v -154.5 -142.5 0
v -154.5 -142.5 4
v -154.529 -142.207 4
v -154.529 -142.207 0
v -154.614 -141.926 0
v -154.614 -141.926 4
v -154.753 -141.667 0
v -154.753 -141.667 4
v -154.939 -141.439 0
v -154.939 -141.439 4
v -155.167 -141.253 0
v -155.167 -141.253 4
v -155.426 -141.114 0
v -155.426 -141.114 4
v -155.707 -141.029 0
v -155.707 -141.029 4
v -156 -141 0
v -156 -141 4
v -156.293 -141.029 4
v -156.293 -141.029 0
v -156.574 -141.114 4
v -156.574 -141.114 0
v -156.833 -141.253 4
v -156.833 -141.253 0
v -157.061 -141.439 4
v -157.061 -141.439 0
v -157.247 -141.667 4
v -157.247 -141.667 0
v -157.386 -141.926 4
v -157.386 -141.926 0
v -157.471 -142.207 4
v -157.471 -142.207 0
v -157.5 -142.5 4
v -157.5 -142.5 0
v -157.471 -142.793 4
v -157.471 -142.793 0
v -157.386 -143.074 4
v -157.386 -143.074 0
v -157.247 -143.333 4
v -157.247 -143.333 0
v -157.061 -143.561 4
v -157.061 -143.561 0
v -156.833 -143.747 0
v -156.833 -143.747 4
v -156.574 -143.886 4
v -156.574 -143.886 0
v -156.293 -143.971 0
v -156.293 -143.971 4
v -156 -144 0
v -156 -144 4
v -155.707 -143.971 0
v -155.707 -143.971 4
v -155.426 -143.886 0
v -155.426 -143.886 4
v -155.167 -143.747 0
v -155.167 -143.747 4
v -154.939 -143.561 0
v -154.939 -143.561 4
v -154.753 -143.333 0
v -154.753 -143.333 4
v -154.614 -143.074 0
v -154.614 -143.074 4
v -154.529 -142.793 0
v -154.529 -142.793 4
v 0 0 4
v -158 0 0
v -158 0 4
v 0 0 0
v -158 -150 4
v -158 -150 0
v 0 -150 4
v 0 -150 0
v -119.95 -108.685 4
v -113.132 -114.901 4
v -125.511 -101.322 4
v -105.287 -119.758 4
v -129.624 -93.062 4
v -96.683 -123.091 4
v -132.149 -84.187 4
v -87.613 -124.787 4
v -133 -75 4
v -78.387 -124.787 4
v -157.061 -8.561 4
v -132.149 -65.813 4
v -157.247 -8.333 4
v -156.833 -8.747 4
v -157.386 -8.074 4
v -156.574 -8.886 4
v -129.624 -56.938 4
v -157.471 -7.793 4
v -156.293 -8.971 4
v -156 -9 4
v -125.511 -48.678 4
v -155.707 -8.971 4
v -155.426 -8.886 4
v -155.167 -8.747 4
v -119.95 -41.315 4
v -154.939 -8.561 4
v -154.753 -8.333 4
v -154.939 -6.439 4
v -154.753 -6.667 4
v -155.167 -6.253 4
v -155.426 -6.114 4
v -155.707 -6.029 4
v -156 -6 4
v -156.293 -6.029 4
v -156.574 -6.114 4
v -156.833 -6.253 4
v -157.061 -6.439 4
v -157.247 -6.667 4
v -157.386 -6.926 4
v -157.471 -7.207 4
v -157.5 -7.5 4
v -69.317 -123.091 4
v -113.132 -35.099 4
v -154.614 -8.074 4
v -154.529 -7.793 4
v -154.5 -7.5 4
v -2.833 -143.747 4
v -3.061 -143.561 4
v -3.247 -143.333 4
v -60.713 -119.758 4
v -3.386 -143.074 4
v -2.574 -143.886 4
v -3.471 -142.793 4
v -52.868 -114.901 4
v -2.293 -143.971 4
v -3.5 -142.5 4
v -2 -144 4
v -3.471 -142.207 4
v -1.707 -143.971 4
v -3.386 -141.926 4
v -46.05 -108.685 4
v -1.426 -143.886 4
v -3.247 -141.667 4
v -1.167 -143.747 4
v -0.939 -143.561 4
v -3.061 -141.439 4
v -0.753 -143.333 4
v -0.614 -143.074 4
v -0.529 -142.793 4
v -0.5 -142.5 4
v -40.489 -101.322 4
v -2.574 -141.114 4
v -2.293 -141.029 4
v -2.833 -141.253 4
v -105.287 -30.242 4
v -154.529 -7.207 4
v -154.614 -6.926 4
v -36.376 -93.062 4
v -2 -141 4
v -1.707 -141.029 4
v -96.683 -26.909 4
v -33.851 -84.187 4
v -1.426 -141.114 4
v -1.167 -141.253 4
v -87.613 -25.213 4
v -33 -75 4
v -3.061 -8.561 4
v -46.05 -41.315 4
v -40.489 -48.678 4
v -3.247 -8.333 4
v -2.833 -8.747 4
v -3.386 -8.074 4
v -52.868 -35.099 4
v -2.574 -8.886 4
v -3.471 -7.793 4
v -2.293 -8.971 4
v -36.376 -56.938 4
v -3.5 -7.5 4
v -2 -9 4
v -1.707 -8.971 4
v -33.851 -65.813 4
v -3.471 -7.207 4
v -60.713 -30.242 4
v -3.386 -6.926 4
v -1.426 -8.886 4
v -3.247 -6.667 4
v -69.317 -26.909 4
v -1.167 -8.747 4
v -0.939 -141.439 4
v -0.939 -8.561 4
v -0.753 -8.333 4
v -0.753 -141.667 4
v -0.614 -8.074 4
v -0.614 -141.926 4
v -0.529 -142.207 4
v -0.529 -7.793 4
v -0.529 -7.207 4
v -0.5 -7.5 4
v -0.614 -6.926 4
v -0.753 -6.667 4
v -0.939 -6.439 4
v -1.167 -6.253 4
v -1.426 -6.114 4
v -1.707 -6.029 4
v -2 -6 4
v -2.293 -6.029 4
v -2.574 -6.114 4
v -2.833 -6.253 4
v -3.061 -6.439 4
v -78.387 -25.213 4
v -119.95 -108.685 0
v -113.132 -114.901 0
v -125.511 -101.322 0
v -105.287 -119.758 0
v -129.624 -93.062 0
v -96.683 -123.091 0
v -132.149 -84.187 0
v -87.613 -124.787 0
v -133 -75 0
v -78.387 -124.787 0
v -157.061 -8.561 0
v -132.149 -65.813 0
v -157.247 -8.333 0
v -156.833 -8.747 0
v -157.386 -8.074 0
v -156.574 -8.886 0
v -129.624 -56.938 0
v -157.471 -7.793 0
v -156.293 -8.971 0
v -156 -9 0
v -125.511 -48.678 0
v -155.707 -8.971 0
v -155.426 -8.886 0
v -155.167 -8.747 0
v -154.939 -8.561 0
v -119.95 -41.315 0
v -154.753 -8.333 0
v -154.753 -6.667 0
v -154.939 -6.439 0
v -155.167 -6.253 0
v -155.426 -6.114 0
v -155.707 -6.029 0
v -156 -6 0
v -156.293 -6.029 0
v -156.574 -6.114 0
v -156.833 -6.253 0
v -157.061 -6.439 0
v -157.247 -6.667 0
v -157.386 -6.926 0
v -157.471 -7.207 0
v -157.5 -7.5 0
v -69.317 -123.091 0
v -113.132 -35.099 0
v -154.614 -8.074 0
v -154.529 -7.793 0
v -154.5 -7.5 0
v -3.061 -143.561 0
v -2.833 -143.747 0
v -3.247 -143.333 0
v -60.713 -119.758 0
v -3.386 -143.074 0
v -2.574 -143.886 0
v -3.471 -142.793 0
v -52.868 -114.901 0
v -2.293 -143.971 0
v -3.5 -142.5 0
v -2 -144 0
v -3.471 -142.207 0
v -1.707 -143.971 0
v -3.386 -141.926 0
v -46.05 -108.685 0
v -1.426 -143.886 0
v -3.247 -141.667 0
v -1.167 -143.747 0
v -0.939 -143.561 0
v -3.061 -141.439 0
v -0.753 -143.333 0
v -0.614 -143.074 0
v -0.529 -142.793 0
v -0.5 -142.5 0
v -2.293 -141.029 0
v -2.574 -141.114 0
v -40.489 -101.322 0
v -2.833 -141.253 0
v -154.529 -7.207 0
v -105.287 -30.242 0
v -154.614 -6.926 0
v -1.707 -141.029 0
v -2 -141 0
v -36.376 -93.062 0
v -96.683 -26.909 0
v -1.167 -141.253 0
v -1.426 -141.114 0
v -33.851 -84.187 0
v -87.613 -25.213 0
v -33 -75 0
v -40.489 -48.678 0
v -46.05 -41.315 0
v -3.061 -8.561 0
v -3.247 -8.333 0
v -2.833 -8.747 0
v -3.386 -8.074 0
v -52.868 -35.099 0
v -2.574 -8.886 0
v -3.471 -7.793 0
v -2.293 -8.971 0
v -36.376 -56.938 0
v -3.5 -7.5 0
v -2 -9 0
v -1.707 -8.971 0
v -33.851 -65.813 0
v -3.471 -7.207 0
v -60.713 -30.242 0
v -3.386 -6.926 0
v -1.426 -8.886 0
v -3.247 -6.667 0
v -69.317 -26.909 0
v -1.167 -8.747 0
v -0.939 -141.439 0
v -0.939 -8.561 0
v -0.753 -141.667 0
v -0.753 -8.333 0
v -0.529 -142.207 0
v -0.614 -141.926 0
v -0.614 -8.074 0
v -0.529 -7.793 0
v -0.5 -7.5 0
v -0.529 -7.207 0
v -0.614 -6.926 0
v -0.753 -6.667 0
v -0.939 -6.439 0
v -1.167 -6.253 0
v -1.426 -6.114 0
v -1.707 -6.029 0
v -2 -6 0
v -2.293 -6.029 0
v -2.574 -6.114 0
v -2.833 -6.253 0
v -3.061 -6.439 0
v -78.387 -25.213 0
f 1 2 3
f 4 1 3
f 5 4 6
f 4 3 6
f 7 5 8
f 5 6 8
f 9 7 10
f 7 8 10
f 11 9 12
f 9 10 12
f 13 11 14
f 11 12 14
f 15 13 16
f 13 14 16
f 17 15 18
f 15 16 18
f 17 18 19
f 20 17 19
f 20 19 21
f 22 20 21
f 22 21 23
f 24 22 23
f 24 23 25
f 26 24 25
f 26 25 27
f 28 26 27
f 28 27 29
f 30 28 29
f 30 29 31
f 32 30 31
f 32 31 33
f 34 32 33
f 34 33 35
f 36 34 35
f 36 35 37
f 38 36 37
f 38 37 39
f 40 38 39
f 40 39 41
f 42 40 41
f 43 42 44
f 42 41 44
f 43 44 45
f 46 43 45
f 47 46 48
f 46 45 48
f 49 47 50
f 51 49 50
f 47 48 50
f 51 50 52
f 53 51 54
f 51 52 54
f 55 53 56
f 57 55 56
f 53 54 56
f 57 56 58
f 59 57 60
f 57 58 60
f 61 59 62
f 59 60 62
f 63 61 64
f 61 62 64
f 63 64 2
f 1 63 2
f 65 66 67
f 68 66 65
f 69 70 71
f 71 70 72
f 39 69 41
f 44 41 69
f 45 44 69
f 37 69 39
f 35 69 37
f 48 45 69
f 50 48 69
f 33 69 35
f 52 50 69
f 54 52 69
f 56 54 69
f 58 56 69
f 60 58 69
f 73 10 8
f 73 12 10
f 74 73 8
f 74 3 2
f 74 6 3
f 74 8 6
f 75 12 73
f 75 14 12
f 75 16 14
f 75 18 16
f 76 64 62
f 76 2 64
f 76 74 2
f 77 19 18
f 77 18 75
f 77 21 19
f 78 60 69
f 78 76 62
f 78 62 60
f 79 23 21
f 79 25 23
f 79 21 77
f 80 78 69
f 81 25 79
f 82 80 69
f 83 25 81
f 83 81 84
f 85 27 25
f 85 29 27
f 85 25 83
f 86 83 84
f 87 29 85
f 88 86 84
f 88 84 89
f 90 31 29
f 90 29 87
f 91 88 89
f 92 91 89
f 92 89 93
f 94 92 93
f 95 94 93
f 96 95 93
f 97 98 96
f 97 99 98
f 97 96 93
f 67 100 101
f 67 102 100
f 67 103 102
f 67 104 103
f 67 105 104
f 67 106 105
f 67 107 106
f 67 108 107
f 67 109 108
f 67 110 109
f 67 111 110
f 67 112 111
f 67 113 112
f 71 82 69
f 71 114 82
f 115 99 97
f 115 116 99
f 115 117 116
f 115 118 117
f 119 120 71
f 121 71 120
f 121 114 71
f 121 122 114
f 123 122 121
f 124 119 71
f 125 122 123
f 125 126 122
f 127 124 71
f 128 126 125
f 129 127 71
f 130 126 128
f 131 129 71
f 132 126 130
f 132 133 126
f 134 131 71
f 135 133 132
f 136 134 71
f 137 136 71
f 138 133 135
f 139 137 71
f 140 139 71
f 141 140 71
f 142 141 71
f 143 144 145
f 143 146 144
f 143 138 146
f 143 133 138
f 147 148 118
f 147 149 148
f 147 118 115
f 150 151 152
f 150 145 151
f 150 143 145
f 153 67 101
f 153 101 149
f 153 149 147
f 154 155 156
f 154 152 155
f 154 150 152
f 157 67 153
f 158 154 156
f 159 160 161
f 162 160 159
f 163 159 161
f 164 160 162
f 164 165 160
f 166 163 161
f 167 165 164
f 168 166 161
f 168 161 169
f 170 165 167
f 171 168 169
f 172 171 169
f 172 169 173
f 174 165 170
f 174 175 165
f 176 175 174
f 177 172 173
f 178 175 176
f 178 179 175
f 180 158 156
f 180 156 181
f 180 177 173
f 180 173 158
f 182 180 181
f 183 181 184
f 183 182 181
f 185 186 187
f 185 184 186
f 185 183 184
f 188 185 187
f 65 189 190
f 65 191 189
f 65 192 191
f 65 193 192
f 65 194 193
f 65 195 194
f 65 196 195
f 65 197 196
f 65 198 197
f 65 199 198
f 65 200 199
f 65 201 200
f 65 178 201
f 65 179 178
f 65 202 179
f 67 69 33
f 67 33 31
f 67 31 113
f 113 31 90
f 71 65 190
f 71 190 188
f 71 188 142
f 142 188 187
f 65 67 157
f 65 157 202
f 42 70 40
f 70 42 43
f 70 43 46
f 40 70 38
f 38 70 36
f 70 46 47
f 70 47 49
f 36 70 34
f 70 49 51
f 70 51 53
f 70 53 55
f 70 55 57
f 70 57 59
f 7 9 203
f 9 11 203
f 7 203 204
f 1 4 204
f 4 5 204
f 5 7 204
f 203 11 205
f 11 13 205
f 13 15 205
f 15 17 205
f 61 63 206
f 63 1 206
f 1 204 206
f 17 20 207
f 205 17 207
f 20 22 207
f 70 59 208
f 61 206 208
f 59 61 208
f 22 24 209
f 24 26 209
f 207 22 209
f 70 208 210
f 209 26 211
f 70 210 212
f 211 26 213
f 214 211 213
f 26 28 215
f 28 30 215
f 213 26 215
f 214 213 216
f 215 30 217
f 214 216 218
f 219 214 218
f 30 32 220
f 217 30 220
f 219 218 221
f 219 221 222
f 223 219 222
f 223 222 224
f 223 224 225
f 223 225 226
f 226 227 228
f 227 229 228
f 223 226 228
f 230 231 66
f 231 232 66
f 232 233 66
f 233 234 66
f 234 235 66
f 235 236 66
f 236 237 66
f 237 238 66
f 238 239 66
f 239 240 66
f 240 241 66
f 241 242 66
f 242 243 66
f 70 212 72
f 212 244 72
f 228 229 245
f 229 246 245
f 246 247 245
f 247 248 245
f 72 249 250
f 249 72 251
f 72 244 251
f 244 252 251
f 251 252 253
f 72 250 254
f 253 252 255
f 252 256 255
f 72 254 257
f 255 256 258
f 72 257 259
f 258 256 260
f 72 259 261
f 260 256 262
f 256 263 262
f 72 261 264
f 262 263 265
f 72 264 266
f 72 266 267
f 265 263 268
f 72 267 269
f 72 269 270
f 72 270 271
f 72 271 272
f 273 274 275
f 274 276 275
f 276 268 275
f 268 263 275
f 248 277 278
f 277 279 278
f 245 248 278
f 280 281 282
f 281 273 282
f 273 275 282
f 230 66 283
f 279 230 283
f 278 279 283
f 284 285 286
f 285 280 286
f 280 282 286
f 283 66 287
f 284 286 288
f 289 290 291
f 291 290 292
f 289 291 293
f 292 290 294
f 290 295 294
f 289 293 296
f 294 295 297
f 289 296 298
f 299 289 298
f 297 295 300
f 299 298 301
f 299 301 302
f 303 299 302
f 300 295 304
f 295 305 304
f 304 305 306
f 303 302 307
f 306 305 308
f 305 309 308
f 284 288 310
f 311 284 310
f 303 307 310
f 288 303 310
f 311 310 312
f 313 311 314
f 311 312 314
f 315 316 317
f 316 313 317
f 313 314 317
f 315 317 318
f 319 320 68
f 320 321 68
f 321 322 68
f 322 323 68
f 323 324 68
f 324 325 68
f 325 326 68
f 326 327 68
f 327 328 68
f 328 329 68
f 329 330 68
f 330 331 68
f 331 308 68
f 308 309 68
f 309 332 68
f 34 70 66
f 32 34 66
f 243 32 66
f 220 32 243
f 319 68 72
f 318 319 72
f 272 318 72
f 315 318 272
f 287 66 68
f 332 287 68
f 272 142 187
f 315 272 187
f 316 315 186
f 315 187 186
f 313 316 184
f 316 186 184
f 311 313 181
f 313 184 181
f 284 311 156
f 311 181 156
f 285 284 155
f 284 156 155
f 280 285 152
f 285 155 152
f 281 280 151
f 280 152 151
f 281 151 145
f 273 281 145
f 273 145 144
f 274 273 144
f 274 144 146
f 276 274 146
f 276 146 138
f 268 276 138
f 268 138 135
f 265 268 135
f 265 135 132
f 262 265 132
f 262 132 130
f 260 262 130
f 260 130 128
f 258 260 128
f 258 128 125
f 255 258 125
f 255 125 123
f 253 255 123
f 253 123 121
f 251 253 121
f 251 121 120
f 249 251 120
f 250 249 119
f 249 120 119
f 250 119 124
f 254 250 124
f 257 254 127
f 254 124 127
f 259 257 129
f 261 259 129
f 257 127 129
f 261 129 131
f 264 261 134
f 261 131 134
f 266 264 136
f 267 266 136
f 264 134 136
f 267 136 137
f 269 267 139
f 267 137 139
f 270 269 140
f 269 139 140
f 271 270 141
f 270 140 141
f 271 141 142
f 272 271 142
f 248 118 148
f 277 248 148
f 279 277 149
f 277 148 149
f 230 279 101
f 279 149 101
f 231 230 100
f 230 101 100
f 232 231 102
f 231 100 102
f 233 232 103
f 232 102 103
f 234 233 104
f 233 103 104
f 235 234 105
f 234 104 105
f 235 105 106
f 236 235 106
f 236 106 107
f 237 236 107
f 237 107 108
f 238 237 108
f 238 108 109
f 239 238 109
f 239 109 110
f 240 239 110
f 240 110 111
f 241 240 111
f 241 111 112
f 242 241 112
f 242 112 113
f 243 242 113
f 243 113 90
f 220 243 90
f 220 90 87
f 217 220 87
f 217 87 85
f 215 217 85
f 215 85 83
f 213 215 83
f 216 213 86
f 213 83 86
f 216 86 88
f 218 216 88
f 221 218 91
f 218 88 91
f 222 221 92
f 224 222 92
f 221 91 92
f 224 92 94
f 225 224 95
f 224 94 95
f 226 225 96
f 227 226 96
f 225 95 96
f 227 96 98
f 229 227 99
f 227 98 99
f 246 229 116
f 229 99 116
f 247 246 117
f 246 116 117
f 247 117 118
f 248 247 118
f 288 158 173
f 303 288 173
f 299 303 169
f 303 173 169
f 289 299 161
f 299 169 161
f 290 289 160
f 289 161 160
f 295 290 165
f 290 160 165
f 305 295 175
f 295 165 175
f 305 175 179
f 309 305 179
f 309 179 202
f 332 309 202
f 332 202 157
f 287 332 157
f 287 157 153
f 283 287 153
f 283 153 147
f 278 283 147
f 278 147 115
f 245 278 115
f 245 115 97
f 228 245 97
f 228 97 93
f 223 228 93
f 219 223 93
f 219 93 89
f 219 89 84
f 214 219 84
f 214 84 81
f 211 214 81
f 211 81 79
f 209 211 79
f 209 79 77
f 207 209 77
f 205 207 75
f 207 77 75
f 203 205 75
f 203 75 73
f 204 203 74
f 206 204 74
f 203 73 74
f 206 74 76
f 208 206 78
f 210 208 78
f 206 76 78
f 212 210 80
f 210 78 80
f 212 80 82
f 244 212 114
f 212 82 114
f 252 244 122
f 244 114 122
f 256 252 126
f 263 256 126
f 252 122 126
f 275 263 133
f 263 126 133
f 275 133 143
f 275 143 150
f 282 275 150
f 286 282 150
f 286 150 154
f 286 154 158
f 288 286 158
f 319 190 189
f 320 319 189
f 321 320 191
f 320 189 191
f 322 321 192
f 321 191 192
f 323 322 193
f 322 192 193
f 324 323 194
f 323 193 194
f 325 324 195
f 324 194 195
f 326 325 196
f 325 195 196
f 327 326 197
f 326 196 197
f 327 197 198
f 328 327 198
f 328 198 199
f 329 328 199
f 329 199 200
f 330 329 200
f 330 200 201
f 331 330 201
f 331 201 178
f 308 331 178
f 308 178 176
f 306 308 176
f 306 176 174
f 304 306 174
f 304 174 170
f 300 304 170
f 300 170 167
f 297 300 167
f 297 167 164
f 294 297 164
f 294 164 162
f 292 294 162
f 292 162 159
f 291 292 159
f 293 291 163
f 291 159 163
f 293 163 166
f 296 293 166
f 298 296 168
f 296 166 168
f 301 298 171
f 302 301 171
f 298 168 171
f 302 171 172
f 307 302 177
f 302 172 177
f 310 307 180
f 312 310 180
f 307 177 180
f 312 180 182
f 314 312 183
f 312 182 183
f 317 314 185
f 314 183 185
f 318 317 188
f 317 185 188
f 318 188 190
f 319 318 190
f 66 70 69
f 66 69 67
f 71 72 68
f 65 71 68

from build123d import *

# Parameters (mm, degrees)
F0_W     = 158
F0_H     = 150
F1_DEPTH = 4
F2_R     = 1.5
F3_DEPTH = 25
F4_R     = 50
F5_DEPTH = 25


with BuildPart() as f1:
    # F0 (on Top) → F1 (new body)
    with BuildSketch(Plane.XY):
        with Locations((-79, -75)):
            Rectangle(F0_W, F0_H)
    extrude(amount=F1_DEPTH)

    # F2 (on face) → F3 (cut)
    with BuildSketch(Plane.XY.offset(4)):
        with Locations((-156, -142.5)):
            Circle(F2_R)
        with Locations((-2, -142.5)):
            Circle(F2_R)
        with Locations((-156, -7.5)):
            Circle(F2_R)
        with Locations((-2, -7.5)):
            Circle(F2_R)
    extrude(amount=-F3_DEPTH, mode=Mode.SUBTRACT)

    # F4 (on face) → F5 (cut)
    with BuildSketch(Plane.XY.offset(4)):
        with Locations((-83, -75)):
            Circle(F4_R)
    extrude(amount=-F5_DEPTH, mode=Mode.SUBTRACT)


solid = f1.part
